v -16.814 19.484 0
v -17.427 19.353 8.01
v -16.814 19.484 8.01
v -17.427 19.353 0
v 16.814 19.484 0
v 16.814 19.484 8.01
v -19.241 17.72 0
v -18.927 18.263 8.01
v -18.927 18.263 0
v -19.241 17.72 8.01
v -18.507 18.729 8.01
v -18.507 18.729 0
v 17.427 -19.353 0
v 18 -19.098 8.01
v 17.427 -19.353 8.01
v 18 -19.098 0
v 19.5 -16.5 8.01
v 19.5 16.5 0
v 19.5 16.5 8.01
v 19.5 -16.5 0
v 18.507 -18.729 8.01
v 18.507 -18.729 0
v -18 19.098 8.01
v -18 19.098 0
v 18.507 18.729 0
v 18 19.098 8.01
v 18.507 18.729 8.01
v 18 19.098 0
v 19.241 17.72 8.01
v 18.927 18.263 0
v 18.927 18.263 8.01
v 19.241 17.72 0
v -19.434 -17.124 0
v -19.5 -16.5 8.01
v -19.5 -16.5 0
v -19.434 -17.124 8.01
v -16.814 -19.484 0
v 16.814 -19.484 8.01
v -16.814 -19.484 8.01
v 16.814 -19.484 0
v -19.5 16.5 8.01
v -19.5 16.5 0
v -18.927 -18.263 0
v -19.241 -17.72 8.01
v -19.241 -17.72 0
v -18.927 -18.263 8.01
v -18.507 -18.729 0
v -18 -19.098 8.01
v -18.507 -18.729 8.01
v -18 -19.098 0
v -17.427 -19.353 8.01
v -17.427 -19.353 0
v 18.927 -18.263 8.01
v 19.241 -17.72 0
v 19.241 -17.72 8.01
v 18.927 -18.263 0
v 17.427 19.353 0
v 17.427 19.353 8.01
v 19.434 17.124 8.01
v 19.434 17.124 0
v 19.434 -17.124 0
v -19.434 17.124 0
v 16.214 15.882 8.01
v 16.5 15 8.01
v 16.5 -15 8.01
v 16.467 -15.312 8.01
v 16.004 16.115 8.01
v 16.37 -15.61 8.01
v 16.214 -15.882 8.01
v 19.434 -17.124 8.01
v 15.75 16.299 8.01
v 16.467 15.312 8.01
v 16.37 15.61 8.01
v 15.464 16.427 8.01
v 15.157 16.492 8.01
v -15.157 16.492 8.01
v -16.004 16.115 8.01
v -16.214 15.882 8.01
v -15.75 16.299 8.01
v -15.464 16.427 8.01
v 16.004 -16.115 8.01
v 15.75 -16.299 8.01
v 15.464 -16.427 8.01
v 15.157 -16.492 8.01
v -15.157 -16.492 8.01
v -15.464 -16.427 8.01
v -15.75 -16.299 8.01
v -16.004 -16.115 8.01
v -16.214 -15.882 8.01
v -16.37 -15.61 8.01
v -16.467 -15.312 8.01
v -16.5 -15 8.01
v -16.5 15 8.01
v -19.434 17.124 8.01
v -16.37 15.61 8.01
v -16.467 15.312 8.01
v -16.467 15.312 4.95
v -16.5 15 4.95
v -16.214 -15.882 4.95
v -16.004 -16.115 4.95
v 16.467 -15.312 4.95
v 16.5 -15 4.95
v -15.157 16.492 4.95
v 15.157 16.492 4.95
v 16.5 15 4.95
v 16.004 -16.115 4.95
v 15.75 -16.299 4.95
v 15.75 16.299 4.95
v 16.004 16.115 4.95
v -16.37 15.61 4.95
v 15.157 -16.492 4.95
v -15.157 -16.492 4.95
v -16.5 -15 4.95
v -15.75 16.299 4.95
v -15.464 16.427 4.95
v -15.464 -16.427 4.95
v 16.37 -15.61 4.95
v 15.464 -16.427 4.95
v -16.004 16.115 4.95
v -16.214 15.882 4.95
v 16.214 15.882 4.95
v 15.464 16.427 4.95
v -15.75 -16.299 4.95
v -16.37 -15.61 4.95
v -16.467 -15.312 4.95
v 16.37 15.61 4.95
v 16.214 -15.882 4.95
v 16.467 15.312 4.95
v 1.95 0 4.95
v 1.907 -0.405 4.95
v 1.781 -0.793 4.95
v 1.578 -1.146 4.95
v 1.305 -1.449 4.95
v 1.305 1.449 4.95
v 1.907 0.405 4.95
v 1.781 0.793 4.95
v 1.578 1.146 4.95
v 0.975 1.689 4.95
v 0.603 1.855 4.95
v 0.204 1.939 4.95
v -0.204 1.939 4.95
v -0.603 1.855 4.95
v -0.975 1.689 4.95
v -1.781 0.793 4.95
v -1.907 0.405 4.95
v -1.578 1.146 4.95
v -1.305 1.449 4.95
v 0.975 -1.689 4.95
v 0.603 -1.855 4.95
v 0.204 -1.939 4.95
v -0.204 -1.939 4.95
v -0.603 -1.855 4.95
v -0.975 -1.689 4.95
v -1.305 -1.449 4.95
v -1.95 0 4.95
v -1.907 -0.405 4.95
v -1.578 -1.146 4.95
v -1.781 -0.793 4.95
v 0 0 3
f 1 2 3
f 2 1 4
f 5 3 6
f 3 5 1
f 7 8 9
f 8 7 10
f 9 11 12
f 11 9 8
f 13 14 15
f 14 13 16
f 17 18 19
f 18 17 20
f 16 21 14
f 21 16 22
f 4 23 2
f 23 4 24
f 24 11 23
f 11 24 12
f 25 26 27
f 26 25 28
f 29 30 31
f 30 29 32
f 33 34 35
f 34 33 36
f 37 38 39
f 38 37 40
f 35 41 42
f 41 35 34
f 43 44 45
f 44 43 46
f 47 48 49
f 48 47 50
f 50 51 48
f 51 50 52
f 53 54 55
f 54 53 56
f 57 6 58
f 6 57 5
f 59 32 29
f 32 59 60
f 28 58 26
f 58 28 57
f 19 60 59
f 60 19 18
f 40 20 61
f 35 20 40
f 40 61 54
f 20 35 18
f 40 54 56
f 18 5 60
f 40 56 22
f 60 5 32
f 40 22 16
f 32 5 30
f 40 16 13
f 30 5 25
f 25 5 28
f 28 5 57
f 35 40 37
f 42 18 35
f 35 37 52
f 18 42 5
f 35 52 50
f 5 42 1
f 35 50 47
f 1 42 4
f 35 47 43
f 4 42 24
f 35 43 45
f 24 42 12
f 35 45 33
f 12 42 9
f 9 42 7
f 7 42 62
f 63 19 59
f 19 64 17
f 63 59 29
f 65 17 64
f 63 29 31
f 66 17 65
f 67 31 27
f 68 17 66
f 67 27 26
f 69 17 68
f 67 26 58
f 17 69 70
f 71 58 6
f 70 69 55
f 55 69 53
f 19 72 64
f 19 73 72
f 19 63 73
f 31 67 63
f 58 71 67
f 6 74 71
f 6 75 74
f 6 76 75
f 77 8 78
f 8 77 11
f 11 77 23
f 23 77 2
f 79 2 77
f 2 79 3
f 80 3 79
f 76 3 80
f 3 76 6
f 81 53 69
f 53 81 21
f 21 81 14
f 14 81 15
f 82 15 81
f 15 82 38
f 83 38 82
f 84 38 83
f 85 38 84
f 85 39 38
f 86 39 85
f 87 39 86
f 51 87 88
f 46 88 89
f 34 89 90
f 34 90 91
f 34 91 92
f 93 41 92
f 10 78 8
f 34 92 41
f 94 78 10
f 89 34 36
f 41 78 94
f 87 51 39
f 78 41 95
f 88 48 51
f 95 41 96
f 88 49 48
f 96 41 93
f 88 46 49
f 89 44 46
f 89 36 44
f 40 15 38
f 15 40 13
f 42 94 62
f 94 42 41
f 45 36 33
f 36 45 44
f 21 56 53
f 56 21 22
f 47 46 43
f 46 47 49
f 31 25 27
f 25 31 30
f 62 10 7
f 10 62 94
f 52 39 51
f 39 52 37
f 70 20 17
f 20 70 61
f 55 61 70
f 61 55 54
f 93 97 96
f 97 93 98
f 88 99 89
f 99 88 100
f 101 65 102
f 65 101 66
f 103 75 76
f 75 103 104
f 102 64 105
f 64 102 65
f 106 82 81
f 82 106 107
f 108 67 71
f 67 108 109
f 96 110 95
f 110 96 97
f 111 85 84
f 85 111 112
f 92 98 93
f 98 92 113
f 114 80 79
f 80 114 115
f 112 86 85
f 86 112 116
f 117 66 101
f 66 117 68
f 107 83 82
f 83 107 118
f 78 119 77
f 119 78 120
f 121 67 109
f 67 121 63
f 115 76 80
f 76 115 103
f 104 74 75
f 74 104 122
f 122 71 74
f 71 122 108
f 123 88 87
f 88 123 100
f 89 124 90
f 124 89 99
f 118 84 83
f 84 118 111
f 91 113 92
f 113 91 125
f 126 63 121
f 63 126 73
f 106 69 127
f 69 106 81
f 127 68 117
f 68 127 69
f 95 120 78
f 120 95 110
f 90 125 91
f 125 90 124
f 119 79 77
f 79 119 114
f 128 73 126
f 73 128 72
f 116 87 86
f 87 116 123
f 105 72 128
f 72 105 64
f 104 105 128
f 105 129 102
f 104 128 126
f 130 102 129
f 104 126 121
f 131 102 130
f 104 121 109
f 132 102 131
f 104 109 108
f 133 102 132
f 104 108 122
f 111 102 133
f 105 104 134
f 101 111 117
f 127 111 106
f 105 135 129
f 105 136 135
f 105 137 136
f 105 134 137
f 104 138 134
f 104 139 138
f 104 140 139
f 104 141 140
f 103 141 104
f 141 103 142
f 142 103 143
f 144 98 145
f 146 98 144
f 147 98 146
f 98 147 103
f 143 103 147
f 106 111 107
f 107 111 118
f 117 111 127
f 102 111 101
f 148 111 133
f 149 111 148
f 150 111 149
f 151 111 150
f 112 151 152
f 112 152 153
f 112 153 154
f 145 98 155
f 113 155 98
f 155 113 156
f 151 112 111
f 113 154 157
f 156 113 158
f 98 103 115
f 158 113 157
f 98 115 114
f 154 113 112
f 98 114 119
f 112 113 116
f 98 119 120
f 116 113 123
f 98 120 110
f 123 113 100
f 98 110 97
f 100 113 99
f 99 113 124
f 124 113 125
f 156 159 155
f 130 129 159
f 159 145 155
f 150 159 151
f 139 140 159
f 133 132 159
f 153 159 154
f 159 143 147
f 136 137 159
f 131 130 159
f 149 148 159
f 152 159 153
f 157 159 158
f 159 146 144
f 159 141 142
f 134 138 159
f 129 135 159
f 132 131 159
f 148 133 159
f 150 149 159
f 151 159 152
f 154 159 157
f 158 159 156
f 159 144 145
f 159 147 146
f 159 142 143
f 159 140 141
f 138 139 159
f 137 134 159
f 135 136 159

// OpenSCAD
$fn=30;

epsilon = 0.05;
mold_bottom_thickness = 5.0;
letter_thickness = 2.0;
rubber_base_thickness = 3.0;

letter = "";
font_size = 20;
bounding_square_size = 33;

// The outside shell to hold in the liquid rubber

difference(){
    // Rounding the edges seems to held the mold stick to the build plate
    // on the 3d printer
     
     minkowski(){
        linear_extrude(mold_bottom_thickness + rubber_base_thickness){
            square(size=bounding_square_size, center=true);
        }
    
        cylinder(r=3,h=0.01);
    }

    minkowski(){
        linear_extrude(mold_bottom_thickness + rubber_base_thickness + epsilon){
            square(size=bounding_square_size - 3, center=true);
        }
        
        cylinder(r1 = 1.5, r2 = 1.5, h = mold_bottom_thickness + rubber_base_thickness + epsilon);
    }

}


// The letter
difference(){
    // Make a block into which the letter's shape will be cut
    linear_extrude(mold_bottom_thickness - epsilon){
        square(size=bounding_square_size + epsilon, center=true);
    }

    translate([0,0,mold_bottom_thickness - letter_thickness]){
        rotate(a=180,v=[0,0,1]){
            // This produces a slope between the face of the letter and
            // the base of the rubber stamp. This eases demolding
            minkowski(){
                linear_extrude(letter_thickness){
                    text(text=letter,
                         font="Noto Sans Armenian:style=Regular",
                         size=font_size,
                         valign="center",
                         halign="center");
                }
                cylinder(r1 = 0, r2 = 2, h = letter_thickness);
            }
        }
    }
 }
